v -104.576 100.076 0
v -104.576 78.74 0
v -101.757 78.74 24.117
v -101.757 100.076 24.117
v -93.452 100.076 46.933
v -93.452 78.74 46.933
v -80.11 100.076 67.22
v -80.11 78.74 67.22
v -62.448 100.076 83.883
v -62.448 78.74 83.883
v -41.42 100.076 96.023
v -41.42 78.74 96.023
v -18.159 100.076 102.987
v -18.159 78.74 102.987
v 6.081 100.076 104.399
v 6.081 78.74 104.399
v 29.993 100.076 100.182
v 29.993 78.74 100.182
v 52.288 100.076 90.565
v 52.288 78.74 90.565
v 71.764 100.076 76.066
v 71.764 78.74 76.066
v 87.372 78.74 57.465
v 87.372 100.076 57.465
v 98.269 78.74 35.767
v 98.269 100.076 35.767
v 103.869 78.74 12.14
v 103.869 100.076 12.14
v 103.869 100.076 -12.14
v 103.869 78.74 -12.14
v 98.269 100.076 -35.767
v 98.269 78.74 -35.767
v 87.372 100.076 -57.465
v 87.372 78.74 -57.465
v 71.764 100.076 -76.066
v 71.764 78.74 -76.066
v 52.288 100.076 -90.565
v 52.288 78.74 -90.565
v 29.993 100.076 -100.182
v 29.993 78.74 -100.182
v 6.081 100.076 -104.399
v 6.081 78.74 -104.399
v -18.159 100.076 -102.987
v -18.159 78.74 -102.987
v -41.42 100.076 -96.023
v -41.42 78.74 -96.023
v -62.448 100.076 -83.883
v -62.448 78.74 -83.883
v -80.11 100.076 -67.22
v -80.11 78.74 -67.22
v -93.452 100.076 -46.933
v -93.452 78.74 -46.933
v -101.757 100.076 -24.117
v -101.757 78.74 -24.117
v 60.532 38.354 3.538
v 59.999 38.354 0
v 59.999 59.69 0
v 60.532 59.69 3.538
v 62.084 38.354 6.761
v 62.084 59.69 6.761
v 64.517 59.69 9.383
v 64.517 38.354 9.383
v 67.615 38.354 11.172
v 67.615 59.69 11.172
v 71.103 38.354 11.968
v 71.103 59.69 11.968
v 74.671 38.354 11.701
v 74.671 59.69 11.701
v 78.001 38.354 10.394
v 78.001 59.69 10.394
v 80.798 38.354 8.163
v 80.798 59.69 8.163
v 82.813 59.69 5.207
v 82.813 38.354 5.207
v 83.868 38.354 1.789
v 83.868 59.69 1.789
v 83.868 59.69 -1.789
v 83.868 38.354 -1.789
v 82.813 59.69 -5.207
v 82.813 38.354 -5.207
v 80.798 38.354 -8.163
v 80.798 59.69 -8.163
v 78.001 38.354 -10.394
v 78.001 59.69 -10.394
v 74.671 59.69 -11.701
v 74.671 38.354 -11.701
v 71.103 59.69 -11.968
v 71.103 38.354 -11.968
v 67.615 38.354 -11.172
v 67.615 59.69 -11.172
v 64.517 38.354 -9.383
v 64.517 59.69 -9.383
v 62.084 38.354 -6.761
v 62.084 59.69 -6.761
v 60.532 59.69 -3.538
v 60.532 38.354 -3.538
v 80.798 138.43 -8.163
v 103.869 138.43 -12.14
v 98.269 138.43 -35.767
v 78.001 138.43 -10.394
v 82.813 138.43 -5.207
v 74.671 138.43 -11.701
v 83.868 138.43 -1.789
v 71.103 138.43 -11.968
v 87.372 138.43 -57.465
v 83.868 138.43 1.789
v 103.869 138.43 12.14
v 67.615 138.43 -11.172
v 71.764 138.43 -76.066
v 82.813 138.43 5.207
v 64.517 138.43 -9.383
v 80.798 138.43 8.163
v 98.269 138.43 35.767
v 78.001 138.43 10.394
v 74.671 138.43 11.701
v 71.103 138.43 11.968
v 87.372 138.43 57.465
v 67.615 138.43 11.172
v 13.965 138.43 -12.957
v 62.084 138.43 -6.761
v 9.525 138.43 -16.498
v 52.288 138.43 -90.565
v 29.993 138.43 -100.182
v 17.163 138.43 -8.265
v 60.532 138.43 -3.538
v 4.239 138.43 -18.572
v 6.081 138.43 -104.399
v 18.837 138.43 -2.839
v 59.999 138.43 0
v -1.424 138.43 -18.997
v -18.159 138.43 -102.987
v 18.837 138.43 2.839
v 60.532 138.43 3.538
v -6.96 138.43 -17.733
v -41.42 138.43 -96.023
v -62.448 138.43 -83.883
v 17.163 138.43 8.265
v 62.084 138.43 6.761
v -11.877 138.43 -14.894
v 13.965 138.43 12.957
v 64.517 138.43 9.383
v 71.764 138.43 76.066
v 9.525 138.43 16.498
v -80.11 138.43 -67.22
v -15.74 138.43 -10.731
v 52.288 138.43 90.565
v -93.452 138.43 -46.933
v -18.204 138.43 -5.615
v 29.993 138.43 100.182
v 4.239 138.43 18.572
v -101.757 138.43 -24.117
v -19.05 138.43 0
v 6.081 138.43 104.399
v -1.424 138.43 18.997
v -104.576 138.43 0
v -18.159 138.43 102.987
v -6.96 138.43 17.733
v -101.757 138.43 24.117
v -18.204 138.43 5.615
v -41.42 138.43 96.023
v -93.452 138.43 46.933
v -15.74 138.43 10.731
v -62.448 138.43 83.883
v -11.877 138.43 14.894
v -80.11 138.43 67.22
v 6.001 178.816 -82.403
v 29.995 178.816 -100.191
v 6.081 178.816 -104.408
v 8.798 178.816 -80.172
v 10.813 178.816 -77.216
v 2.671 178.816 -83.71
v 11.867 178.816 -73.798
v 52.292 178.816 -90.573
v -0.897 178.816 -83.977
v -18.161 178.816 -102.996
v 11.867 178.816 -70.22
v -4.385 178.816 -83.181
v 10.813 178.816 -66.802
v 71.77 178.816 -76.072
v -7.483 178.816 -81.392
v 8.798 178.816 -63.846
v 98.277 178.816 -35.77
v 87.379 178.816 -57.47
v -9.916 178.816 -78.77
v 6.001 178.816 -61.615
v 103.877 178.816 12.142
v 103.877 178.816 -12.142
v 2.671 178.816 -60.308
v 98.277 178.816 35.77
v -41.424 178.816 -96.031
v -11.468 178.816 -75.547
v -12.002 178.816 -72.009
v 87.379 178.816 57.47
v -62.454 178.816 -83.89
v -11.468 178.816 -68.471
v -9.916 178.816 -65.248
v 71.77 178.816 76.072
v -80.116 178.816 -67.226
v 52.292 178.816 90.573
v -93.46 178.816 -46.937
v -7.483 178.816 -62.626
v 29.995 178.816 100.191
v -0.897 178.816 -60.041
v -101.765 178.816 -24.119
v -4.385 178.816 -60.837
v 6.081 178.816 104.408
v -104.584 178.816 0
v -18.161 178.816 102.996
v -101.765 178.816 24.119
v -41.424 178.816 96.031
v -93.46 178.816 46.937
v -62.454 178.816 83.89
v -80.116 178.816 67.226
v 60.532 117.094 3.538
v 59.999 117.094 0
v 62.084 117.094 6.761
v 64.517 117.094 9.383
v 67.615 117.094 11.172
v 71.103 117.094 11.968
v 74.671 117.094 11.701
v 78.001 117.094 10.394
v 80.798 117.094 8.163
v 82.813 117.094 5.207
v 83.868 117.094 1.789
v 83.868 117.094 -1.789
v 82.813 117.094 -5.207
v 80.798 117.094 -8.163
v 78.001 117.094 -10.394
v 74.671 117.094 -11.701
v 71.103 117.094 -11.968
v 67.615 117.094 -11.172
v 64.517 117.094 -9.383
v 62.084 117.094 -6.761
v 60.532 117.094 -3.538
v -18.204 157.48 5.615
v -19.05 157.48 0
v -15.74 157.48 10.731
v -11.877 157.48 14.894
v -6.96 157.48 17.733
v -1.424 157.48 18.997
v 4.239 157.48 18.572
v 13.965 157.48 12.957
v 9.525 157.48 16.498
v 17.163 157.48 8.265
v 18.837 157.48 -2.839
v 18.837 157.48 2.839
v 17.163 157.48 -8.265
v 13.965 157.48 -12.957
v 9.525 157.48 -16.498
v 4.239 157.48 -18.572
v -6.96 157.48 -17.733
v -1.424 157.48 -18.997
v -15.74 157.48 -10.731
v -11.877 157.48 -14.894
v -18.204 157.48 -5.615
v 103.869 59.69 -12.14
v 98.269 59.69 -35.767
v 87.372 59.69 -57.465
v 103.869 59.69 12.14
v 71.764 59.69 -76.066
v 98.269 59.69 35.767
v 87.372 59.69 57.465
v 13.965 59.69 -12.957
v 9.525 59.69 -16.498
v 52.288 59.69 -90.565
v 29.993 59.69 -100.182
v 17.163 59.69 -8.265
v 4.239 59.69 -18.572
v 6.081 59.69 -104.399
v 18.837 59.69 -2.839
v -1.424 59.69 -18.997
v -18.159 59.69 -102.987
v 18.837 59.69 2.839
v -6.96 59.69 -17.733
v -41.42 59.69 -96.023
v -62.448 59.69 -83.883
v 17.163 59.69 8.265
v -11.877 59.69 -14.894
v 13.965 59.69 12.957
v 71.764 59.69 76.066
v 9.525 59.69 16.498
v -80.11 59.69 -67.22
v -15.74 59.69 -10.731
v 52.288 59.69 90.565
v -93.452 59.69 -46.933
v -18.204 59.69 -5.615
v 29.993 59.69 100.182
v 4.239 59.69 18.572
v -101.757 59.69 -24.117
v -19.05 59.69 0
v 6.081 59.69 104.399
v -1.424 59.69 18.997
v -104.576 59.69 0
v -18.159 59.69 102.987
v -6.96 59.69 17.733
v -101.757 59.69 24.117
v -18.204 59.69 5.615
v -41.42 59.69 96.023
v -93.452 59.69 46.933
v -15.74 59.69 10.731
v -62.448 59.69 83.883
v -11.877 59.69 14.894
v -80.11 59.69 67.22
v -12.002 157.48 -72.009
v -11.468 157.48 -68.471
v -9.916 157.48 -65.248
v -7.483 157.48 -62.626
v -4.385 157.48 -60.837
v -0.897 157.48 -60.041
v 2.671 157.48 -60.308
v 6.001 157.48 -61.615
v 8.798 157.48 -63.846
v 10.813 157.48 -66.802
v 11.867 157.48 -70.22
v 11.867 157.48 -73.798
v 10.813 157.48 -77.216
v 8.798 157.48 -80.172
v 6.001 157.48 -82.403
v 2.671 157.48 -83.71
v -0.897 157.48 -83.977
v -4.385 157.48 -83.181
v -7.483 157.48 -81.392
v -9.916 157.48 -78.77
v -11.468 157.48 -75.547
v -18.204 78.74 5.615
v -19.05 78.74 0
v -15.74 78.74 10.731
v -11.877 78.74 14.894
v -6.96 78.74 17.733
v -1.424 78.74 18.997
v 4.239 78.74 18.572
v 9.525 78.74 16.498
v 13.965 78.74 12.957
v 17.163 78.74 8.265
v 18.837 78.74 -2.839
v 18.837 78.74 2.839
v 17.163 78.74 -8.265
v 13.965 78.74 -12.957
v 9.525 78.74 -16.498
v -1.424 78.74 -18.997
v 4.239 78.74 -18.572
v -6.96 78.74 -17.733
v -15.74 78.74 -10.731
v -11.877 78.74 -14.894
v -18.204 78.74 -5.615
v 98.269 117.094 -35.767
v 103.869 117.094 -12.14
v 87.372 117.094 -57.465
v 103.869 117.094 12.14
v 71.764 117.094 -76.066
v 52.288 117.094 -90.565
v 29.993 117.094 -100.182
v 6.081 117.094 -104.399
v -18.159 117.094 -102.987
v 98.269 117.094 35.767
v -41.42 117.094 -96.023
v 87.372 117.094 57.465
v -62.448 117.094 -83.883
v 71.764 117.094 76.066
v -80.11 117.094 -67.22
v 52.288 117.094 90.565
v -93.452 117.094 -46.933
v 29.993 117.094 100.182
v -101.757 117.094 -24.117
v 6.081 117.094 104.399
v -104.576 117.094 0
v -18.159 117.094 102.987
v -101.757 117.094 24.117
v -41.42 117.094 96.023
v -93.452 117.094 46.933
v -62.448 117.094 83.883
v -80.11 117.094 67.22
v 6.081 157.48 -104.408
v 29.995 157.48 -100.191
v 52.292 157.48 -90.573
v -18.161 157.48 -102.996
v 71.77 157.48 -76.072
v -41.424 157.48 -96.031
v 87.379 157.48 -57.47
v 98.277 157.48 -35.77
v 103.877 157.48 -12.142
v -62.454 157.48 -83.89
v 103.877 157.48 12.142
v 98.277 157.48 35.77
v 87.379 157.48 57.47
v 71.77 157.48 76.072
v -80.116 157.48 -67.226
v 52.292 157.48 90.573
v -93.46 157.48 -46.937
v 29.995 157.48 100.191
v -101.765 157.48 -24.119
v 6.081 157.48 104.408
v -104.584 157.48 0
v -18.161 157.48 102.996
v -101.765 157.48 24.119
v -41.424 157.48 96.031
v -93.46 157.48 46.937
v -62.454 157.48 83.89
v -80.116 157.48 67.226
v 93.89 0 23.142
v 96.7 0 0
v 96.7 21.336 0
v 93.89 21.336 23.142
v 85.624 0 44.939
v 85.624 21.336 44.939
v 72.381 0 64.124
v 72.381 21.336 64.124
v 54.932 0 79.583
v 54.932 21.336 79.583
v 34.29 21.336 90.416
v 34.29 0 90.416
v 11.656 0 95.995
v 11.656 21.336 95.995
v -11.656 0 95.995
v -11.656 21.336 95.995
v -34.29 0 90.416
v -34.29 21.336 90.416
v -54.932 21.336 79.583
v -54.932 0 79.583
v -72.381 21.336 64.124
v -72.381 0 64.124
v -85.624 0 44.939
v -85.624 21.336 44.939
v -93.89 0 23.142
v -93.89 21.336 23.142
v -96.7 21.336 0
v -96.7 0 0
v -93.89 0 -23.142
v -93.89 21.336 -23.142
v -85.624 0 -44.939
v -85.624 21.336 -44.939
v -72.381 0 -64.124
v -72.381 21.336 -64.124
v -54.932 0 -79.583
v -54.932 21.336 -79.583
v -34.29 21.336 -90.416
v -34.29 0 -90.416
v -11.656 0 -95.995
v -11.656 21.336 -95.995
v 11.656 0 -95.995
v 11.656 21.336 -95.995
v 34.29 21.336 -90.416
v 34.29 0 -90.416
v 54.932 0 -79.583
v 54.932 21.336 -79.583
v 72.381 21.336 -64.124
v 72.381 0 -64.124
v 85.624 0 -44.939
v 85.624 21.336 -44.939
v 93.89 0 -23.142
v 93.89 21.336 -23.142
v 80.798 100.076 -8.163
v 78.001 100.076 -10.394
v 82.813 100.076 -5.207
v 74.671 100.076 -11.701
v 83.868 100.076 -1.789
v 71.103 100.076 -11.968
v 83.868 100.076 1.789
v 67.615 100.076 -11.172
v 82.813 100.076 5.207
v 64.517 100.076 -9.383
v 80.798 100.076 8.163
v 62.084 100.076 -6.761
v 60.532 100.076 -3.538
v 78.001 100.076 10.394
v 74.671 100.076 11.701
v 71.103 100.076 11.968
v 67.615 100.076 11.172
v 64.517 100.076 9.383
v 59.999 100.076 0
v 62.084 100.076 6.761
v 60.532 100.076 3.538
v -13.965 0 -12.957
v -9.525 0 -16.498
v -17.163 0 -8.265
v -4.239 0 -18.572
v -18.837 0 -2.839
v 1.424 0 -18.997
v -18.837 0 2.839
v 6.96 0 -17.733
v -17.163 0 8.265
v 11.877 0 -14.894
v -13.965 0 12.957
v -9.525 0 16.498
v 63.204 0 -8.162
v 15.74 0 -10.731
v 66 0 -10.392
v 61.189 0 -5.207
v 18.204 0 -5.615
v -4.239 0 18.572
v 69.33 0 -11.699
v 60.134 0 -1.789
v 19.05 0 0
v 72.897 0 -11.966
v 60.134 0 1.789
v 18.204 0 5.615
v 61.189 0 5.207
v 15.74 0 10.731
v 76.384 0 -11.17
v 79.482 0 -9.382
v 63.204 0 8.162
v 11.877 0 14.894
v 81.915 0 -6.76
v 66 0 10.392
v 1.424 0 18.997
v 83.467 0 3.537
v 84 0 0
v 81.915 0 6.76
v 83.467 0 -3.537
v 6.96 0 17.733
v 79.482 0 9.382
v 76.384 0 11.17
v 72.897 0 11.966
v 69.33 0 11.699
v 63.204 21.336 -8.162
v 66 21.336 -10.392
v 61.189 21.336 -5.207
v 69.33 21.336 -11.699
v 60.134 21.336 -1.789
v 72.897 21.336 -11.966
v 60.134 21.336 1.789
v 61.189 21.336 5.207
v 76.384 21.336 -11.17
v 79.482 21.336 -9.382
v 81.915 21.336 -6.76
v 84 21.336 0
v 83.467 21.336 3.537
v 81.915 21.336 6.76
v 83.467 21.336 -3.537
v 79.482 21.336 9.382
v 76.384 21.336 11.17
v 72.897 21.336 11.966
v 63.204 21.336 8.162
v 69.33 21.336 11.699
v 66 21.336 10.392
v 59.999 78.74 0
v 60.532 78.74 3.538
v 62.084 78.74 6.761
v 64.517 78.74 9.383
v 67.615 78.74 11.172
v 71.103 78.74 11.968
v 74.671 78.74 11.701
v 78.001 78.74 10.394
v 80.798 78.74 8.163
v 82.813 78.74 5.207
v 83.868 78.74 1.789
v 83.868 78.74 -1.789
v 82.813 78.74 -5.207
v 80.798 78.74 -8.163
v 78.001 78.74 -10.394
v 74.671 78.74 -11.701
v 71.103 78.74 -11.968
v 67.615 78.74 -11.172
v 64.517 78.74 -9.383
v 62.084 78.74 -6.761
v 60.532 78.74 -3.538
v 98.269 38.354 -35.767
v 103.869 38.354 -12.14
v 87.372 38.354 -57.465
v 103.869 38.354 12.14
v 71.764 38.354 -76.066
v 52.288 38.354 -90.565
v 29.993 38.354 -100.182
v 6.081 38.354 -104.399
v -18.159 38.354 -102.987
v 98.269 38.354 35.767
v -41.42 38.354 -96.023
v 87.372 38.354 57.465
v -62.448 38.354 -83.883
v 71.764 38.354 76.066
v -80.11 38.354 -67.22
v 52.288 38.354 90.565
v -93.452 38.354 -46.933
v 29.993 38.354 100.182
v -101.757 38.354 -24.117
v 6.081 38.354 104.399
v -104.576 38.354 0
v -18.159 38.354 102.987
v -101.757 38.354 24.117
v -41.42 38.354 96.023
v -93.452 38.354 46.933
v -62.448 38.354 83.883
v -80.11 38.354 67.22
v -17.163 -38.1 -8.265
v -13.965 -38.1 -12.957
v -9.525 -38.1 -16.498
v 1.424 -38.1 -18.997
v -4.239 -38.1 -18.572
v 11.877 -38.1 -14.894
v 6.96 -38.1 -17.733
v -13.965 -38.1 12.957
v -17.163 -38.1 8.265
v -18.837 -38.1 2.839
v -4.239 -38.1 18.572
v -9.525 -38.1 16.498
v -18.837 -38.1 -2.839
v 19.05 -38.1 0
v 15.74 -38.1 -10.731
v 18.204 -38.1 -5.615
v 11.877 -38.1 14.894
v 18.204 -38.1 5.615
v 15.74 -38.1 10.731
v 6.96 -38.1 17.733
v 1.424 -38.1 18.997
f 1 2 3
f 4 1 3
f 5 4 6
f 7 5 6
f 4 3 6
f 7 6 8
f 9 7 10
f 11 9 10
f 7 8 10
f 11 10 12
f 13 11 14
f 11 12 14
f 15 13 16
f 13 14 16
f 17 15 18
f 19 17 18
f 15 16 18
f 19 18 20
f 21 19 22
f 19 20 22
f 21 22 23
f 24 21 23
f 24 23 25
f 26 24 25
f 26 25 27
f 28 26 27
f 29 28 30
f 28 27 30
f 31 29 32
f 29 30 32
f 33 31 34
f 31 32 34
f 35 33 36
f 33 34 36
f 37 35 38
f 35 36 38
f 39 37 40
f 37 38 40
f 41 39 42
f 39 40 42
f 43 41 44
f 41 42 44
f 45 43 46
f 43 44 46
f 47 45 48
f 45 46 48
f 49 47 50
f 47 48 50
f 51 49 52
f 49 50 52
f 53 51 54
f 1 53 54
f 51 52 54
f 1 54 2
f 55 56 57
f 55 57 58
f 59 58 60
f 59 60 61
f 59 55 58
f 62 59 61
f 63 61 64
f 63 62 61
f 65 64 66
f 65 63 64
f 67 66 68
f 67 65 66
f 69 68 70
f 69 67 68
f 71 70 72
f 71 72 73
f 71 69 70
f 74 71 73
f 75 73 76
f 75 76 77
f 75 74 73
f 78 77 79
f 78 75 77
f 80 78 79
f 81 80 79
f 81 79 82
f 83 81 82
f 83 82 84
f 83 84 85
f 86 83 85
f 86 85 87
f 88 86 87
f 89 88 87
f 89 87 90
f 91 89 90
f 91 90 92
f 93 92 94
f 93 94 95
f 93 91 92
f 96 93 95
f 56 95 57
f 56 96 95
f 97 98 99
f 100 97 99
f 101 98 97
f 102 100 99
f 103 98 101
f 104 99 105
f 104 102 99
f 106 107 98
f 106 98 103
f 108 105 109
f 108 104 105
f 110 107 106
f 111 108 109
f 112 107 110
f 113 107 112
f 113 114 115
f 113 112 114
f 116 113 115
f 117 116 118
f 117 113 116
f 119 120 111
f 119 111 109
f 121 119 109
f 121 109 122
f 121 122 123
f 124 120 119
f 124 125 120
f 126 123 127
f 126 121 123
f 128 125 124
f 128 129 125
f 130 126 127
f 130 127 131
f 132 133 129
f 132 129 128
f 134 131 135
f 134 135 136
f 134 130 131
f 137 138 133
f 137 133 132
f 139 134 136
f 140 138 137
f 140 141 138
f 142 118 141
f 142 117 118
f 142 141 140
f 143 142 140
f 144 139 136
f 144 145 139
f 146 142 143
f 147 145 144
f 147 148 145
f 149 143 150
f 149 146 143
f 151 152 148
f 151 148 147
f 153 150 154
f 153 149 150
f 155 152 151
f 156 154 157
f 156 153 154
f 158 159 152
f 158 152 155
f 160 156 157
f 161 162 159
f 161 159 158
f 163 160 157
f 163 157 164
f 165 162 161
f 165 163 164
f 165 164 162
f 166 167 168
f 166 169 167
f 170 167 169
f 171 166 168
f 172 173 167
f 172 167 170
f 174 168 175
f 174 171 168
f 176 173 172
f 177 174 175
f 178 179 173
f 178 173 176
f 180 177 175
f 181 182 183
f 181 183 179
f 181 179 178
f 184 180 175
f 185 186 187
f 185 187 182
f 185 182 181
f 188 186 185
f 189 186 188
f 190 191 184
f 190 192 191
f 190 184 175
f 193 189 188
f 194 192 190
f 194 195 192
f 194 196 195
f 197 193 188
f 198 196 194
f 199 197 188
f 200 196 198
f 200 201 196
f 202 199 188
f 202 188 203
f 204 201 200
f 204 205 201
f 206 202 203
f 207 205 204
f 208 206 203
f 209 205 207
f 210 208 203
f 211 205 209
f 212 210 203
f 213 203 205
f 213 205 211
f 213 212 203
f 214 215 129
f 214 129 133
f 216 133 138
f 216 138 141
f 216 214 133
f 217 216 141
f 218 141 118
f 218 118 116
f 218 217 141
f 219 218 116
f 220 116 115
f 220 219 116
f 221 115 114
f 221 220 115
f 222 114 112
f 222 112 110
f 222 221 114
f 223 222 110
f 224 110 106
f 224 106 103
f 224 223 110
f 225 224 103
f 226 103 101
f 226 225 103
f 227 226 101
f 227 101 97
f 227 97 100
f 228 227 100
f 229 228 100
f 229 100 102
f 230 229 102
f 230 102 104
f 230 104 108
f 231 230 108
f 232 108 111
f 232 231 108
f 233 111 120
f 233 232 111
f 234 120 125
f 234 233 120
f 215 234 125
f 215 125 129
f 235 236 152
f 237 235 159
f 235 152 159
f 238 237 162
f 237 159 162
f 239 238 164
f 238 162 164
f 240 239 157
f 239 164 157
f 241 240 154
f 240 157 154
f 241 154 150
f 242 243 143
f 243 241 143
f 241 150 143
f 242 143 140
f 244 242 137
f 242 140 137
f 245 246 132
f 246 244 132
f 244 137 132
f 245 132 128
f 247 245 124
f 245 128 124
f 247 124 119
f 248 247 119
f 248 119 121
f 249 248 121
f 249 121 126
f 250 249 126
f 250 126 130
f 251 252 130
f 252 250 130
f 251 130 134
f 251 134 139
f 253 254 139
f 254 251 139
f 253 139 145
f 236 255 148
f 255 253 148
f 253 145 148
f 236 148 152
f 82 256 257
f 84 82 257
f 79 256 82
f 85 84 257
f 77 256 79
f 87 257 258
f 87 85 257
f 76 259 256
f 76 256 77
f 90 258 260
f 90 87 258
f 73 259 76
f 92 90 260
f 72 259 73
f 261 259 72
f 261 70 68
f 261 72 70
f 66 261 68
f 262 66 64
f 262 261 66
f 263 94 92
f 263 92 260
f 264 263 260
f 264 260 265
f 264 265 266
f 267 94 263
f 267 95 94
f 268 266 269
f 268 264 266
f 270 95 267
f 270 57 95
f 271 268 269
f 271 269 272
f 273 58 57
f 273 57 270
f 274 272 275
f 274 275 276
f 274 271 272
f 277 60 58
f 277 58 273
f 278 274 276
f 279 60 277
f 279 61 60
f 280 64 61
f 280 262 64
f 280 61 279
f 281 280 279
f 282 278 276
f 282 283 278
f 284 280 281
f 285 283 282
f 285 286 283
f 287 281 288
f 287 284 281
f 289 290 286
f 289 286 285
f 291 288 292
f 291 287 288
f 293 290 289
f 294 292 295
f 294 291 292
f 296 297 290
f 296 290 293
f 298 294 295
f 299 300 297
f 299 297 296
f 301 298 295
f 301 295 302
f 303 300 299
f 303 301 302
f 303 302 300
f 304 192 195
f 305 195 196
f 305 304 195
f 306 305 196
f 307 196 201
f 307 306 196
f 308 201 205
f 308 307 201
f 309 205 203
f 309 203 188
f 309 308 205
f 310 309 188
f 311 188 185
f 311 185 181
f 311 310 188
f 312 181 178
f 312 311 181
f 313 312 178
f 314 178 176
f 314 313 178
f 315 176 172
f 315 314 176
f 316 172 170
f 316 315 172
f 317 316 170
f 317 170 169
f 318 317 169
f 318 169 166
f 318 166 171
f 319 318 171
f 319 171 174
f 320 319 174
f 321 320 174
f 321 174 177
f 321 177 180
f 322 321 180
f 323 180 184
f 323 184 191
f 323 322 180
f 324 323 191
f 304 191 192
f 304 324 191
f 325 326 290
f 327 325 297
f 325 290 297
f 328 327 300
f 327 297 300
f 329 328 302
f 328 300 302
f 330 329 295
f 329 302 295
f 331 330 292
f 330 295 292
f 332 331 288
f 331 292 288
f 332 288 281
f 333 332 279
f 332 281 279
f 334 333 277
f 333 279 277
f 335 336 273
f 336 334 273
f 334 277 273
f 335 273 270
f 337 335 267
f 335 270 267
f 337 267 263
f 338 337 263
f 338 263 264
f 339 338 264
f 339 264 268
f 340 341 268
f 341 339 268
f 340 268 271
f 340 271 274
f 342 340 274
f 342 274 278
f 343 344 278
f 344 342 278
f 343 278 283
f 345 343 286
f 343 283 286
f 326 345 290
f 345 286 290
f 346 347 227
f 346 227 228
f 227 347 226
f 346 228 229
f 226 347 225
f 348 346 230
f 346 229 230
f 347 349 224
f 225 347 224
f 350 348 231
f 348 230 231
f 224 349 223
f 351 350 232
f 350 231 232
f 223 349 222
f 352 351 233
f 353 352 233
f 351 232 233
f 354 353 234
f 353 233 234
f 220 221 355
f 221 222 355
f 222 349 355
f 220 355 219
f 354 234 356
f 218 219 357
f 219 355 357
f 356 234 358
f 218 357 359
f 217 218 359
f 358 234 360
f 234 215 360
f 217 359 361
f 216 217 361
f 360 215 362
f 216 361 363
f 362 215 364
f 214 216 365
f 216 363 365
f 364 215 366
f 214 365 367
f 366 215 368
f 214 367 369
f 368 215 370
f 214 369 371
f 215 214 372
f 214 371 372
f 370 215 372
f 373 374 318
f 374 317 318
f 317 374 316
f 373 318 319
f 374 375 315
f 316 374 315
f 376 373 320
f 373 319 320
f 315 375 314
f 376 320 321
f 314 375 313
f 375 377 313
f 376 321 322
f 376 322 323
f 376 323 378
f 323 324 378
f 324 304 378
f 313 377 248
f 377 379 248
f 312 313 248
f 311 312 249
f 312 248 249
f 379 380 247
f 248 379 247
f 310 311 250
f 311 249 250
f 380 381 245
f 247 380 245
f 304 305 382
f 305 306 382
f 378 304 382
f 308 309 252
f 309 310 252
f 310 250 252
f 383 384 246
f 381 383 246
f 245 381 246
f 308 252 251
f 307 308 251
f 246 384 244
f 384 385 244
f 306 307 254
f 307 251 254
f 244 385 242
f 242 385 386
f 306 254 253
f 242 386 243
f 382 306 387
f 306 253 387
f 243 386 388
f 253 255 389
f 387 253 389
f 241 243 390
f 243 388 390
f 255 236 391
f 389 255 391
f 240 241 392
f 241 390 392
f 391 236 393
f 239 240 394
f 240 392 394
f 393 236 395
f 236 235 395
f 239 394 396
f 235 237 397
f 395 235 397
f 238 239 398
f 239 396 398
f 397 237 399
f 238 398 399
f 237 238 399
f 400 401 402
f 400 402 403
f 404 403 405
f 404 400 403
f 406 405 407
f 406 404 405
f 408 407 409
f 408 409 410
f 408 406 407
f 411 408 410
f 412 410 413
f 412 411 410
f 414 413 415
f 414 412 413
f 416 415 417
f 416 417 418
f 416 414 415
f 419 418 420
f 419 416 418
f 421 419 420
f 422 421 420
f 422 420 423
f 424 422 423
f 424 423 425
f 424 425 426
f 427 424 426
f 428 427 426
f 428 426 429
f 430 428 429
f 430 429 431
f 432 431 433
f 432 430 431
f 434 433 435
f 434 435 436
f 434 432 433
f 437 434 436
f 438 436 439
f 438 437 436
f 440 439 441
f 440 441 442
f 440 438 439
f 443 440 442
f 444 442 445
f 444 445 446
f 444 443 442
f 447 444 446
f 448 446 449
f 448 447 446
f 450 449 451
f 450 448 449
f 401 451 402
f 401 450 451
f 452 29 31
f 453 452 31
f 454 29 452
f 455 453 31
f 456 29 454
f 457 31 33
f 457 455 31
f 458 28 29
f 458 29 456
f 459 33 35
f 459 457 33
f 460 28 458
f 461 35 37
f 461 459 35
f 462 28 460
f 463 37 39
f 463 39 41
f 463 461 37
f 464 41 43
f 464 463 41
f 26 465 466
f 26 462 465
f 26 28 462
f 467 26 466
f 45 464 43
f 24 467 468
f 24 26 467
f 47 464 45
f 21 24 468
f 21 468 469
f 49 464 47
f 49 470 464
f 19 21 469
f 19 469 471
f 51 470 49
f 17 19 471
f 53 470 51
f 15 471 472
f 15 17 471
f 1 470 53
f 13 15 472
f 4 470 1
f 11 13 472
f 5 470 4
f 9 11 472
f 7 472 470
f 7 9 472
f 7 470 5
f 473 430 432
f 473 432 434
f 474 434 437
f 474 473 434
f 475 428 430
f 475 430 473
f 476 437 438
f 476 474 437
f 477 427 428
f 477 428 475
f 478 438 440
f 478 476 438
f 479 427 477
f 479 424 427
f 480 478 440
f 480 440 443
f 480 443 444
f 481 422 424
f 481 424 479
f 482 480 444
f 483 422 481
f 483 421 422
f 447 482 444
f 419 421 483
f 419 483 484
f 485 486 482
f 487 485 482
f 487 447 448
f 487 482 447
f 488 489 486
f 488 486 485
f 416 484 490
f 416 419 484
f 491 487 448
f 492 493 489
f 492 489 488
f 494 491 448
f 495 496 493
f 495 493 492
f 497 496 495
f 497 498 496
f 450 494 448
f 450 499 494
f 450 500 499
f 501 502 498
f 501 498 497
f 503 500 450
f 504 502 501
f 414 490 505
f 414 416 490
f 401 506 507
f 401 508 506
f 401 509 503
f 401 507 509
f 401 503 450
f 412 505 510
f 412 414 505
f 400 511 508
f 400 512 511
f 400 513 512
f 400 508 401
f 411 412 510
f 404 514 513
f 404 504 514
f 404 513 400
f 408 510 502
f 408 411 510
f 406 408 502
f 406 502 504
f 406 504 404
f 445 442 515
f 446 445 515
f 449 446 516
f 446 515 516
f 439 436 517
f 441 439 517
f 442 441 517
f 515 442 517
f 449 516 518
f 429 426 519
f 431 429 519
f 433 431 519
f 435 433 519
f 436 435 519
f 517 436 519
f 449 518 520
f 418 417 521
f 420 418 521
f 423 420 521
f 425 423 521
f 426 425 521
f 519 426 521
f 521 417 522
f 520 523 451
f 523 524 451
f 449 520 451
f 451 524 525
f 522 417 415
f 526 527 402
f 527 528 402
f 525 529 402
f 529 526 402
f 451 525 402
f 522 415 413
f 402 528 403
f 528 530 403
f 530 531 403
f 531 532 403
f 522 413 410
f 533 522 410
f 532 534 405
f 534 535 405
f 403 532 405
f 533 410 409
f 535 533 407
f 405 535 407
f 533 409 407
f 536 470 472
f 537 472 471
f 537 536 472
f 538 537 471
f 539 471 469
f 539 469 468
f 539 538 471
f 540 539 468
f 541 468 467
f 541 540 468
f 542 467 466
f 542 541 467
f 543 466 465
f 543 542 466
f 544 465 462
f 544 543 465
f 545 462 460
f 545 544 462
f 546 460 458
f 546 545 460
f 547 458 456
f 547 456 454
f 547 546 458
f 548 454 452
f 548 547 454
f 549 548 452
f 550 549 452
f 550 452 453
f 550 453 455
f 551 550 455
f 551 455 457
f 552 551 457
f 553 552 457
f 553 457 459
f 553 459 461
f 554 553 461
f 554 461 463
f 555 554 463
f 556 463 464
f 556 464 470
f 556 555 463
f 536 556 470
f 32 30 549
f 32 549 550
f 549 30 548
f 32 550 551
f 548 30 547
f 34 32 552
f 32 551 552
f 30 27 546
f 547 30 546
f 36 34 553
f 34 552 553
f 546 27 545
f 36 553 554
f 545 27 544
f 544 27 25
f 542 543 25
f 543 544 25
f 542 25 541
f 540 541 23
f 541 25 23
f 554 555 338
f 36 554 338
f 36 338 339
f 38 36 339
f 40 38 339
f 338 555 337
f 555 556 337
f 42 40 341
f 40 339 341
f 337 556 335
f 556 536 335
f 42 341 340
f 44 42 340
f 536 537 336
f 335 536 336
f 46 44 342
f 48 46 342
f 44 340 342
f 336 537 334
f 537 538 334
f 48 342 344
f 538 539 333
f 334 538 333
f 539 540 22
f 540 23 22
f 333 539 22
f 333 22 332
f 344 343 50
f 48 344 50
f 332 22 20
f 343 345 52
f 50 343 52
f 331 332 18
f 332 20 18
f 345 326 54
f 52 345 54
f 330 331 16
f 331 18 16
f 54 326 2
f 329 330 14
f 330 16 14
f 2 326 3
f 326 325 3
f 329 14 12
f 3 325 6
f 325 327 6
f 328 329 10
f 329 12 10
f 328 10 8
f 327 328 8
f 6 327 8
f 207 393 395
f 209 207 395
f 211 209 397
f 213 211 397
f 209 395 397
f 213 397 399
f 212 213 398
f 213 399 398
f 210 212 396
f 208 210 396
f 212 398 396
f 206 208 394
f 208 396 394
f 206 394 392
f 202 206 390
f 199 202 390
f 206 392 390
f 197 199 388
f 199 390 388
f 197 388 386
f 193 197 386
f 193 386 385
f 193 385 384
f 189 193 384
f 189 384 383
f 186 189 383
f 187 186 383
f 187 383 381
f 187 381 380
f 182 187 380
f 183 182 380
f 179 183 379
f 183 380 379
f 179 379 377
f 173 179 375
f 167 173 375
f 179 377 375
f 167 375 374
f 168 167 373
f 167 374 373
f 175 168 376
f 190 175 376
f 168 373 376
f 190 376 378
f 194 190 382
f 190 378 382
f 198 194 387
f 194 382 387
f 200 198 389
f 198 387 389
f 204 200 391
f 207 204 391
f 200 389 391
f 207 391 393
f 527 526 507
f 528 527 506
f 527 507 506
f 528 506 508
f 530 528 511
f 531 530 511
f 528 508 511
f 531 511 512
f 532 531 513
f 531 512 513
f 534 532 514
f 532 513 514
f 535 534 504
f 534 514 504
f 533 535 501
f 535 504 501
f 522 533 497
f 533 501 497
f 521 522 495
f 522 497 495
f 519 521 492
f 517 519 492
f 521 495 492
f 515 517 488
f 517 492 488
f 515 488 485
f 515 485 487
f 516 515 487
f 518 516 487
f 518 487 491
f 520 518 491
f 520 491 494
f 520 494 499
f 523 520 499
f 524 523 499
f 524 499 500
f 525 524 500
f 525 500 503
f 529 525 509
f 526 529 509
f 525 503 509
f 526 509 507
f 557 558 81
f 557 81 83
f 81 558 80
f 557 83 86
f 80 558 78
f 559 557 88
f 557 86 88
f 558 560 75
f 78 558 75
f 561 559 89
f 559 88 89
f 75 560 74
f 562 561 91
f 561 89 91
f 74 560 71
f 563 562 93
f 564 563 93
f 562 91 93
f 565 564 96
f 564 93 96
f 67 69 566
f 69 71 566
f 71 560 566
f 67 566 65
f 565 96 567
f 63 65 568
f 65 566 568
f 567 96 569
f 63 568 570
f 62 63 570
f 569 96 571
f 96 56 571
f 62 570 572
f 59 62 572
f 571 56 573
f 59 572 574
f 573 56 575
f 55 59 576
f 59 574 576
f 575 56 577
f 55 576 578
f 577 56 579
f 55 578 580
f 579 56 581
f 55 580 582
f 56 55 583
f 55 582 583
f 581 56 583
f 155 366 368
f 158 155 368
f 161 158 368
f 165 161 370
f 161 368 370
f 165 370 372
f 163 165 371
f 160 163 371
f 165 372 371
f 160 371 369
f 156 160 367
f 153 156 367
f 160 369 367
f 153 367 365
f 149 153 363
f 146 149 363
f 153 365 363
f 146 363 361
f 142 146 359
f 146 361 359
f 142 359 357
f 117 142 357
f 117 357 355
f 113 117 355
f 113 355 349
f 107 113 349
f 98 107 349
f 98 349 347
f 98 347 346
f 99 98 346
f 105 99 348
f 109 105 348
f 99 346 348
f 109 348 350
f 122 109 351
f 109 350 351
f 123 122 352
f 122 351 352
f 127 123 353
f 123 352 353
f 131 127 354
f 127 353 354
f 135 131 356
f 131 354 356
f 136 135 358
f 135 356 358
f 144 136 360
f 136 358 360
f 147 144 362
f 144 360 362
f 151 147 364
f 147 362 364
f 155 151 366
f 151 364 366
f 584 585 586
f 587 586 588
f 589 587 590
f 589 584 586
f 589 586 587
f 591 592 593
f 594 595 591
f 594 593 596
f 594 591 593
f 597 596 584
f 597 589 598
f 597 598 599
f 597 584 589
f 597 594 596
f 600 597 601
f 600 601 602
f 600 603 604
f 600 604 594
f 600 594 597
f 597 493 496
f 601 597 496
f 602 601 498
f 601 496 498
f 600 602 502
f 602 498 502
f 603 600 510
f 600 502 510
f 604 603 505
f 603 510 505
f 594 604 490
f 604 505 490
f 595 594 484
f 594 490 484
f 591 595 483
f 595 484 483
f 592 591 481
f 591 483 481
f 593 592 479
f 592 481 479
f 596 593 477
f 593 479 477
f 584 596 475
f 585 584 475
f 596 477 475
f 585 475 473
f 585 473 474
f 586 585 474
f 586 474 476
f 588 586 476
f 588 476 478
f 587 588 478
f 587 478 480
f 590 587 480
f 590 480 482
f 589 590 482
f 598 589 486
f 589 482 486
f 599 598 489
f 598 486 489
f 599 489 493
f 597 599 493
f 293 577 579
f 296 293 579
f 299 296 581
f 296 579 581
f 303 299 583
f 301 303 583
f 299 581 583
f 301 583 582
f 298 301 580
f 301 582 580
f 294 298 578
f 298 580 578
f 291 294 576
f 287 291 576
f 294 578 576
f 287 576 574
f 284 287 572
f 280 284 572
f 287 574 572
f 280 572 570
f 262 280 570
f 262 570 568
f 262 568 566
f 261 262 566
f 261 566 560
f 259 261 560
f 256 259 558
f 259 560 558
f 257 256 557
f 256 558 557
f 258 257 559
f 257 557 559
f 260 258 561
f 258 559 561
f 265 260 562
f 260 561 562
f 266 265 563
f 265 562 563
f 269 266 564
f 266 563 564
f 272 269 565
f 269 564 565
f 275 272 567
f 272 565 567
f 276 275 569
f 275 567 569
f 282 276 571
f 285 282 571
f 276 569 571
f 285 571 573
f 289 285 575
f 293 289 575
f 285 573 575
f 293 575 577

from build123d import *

# Parameters (mm, degrees)
F0_R      = 96.700086
F0_R_2    = 11.999976
F1_DEPTH  = 21.336
F2_R      = 19.05
F3_DEPTH  = 38.1
F5_R      = 104.57561
F5_R_2    = 12.0015
F5_R_3    = 19.05
F6_DEPTH  = 21.336
F7_DEPTH  = 61.722
F9_R      = 104.57561
F9_R_2    = 12.0015
F10_DEPTH = 21.336
F12_R     = 104.57561
F12_R_2   = 12.0015
F12_R_3   = 19.05
F13_DEPTH = 21.336
F14_DEPTH = 61.722
F16_R     = 104.5845
F16_R_2   = 12.0015
F17_DEPTH = 21.336


with BuildPart() as f1:
    # F0 (on Front) → F1 (new body)
    with BuildSketch(Plane.XZ):
        Circle(F0_R)
        with Locations((72.00011, 0)):
            Circle(F0_R_2, mode=Mode.SUBTRACT)
    extrude(amount=-F1_DEPTH)

    # F2 (on face) → F3 (join)
    with BuildSketch(Plane.XZ):
        Circle(F2_R)
    extrude(amount=F3_DEPTH)


with BuildPart() as f6:
    # F5 (on offset) → F6 (new body)
    with BuildSketch(Plane(origin=(0, 38.354, 0), x_dir=(-1, 0, 0), z_dir=(0, 1, 0))):
        Circle(F5_R)
        with Locations((-72.00011, 0)):
            Circle(F5_R_2, mode=Mode.SUBTRACT)
        Circle(F5_R_3, mode=Mode.SUBTRACT)
    extrude(amount=F6_DEPTH)

    # F5 (on offset) → F7 (join)
    with BuildSketch(Plane(origin=(0, 38.354, 0), x_dir=(-1, 0, 0), z_dir=(0, 1, 0))):
        Circle(F5_R_3)
    extrude(amount=F7_DEPTH)

    # F9 (on offset) → F10 (join)
    with BuildSketch(Plane(origin=(0, 78.74, 0), x_dir=(-1, 0, 0), z_dir=(0, 1, 0))):
        Circle(F9_R)
        with Locations((-72.00011, 0)):
            Circle(F9_R_2, mode=Mode.SUBTRACT)
    extrude(amount=F10_DEPTH)


with BuildPart() as f13:
    # F12 (on offset) → F13 (new body)
    with BuildSketch(Plane(origin=(0, 117.094, 0), x_dir=(-1, 0, 0), z_dir=(0, 1, 0))):
        Circle(F12_R)
        with Locations((-72.00011, 0)):
            Circle(F12_R_2, mode=Mode.SUBTRACT)
        Circle(F12_R_3, mode=Mode.SUBTRACT)
    extrude(amount=F13_DEPTH)

    # F12 (on offset) → F14 (join)
    with BuildSketch(Plane(origin=(0, 117.094, 0), x_dir=(-1, 0, 0), z_dir=(0, 1, 0))):
        Circle(F12_R_3)
    extrude(amount=F14_DEPTH)

    # F16 (on offset) → F17 (join)
    with BuildSketch(Plane(origin=(0, 157.48, 0), x_dir=(-1, 0, 0), z_dir=(0, 1, 0))):
        Circle(F16_R)
        with Locations((0, -72.009)):
            Circle(F16_R_2, mode=Mode.SUBTRACT)
    extrude(amount=F17_DEPTH)


solid = Compound([f1.part, f6.part, f13.part])
